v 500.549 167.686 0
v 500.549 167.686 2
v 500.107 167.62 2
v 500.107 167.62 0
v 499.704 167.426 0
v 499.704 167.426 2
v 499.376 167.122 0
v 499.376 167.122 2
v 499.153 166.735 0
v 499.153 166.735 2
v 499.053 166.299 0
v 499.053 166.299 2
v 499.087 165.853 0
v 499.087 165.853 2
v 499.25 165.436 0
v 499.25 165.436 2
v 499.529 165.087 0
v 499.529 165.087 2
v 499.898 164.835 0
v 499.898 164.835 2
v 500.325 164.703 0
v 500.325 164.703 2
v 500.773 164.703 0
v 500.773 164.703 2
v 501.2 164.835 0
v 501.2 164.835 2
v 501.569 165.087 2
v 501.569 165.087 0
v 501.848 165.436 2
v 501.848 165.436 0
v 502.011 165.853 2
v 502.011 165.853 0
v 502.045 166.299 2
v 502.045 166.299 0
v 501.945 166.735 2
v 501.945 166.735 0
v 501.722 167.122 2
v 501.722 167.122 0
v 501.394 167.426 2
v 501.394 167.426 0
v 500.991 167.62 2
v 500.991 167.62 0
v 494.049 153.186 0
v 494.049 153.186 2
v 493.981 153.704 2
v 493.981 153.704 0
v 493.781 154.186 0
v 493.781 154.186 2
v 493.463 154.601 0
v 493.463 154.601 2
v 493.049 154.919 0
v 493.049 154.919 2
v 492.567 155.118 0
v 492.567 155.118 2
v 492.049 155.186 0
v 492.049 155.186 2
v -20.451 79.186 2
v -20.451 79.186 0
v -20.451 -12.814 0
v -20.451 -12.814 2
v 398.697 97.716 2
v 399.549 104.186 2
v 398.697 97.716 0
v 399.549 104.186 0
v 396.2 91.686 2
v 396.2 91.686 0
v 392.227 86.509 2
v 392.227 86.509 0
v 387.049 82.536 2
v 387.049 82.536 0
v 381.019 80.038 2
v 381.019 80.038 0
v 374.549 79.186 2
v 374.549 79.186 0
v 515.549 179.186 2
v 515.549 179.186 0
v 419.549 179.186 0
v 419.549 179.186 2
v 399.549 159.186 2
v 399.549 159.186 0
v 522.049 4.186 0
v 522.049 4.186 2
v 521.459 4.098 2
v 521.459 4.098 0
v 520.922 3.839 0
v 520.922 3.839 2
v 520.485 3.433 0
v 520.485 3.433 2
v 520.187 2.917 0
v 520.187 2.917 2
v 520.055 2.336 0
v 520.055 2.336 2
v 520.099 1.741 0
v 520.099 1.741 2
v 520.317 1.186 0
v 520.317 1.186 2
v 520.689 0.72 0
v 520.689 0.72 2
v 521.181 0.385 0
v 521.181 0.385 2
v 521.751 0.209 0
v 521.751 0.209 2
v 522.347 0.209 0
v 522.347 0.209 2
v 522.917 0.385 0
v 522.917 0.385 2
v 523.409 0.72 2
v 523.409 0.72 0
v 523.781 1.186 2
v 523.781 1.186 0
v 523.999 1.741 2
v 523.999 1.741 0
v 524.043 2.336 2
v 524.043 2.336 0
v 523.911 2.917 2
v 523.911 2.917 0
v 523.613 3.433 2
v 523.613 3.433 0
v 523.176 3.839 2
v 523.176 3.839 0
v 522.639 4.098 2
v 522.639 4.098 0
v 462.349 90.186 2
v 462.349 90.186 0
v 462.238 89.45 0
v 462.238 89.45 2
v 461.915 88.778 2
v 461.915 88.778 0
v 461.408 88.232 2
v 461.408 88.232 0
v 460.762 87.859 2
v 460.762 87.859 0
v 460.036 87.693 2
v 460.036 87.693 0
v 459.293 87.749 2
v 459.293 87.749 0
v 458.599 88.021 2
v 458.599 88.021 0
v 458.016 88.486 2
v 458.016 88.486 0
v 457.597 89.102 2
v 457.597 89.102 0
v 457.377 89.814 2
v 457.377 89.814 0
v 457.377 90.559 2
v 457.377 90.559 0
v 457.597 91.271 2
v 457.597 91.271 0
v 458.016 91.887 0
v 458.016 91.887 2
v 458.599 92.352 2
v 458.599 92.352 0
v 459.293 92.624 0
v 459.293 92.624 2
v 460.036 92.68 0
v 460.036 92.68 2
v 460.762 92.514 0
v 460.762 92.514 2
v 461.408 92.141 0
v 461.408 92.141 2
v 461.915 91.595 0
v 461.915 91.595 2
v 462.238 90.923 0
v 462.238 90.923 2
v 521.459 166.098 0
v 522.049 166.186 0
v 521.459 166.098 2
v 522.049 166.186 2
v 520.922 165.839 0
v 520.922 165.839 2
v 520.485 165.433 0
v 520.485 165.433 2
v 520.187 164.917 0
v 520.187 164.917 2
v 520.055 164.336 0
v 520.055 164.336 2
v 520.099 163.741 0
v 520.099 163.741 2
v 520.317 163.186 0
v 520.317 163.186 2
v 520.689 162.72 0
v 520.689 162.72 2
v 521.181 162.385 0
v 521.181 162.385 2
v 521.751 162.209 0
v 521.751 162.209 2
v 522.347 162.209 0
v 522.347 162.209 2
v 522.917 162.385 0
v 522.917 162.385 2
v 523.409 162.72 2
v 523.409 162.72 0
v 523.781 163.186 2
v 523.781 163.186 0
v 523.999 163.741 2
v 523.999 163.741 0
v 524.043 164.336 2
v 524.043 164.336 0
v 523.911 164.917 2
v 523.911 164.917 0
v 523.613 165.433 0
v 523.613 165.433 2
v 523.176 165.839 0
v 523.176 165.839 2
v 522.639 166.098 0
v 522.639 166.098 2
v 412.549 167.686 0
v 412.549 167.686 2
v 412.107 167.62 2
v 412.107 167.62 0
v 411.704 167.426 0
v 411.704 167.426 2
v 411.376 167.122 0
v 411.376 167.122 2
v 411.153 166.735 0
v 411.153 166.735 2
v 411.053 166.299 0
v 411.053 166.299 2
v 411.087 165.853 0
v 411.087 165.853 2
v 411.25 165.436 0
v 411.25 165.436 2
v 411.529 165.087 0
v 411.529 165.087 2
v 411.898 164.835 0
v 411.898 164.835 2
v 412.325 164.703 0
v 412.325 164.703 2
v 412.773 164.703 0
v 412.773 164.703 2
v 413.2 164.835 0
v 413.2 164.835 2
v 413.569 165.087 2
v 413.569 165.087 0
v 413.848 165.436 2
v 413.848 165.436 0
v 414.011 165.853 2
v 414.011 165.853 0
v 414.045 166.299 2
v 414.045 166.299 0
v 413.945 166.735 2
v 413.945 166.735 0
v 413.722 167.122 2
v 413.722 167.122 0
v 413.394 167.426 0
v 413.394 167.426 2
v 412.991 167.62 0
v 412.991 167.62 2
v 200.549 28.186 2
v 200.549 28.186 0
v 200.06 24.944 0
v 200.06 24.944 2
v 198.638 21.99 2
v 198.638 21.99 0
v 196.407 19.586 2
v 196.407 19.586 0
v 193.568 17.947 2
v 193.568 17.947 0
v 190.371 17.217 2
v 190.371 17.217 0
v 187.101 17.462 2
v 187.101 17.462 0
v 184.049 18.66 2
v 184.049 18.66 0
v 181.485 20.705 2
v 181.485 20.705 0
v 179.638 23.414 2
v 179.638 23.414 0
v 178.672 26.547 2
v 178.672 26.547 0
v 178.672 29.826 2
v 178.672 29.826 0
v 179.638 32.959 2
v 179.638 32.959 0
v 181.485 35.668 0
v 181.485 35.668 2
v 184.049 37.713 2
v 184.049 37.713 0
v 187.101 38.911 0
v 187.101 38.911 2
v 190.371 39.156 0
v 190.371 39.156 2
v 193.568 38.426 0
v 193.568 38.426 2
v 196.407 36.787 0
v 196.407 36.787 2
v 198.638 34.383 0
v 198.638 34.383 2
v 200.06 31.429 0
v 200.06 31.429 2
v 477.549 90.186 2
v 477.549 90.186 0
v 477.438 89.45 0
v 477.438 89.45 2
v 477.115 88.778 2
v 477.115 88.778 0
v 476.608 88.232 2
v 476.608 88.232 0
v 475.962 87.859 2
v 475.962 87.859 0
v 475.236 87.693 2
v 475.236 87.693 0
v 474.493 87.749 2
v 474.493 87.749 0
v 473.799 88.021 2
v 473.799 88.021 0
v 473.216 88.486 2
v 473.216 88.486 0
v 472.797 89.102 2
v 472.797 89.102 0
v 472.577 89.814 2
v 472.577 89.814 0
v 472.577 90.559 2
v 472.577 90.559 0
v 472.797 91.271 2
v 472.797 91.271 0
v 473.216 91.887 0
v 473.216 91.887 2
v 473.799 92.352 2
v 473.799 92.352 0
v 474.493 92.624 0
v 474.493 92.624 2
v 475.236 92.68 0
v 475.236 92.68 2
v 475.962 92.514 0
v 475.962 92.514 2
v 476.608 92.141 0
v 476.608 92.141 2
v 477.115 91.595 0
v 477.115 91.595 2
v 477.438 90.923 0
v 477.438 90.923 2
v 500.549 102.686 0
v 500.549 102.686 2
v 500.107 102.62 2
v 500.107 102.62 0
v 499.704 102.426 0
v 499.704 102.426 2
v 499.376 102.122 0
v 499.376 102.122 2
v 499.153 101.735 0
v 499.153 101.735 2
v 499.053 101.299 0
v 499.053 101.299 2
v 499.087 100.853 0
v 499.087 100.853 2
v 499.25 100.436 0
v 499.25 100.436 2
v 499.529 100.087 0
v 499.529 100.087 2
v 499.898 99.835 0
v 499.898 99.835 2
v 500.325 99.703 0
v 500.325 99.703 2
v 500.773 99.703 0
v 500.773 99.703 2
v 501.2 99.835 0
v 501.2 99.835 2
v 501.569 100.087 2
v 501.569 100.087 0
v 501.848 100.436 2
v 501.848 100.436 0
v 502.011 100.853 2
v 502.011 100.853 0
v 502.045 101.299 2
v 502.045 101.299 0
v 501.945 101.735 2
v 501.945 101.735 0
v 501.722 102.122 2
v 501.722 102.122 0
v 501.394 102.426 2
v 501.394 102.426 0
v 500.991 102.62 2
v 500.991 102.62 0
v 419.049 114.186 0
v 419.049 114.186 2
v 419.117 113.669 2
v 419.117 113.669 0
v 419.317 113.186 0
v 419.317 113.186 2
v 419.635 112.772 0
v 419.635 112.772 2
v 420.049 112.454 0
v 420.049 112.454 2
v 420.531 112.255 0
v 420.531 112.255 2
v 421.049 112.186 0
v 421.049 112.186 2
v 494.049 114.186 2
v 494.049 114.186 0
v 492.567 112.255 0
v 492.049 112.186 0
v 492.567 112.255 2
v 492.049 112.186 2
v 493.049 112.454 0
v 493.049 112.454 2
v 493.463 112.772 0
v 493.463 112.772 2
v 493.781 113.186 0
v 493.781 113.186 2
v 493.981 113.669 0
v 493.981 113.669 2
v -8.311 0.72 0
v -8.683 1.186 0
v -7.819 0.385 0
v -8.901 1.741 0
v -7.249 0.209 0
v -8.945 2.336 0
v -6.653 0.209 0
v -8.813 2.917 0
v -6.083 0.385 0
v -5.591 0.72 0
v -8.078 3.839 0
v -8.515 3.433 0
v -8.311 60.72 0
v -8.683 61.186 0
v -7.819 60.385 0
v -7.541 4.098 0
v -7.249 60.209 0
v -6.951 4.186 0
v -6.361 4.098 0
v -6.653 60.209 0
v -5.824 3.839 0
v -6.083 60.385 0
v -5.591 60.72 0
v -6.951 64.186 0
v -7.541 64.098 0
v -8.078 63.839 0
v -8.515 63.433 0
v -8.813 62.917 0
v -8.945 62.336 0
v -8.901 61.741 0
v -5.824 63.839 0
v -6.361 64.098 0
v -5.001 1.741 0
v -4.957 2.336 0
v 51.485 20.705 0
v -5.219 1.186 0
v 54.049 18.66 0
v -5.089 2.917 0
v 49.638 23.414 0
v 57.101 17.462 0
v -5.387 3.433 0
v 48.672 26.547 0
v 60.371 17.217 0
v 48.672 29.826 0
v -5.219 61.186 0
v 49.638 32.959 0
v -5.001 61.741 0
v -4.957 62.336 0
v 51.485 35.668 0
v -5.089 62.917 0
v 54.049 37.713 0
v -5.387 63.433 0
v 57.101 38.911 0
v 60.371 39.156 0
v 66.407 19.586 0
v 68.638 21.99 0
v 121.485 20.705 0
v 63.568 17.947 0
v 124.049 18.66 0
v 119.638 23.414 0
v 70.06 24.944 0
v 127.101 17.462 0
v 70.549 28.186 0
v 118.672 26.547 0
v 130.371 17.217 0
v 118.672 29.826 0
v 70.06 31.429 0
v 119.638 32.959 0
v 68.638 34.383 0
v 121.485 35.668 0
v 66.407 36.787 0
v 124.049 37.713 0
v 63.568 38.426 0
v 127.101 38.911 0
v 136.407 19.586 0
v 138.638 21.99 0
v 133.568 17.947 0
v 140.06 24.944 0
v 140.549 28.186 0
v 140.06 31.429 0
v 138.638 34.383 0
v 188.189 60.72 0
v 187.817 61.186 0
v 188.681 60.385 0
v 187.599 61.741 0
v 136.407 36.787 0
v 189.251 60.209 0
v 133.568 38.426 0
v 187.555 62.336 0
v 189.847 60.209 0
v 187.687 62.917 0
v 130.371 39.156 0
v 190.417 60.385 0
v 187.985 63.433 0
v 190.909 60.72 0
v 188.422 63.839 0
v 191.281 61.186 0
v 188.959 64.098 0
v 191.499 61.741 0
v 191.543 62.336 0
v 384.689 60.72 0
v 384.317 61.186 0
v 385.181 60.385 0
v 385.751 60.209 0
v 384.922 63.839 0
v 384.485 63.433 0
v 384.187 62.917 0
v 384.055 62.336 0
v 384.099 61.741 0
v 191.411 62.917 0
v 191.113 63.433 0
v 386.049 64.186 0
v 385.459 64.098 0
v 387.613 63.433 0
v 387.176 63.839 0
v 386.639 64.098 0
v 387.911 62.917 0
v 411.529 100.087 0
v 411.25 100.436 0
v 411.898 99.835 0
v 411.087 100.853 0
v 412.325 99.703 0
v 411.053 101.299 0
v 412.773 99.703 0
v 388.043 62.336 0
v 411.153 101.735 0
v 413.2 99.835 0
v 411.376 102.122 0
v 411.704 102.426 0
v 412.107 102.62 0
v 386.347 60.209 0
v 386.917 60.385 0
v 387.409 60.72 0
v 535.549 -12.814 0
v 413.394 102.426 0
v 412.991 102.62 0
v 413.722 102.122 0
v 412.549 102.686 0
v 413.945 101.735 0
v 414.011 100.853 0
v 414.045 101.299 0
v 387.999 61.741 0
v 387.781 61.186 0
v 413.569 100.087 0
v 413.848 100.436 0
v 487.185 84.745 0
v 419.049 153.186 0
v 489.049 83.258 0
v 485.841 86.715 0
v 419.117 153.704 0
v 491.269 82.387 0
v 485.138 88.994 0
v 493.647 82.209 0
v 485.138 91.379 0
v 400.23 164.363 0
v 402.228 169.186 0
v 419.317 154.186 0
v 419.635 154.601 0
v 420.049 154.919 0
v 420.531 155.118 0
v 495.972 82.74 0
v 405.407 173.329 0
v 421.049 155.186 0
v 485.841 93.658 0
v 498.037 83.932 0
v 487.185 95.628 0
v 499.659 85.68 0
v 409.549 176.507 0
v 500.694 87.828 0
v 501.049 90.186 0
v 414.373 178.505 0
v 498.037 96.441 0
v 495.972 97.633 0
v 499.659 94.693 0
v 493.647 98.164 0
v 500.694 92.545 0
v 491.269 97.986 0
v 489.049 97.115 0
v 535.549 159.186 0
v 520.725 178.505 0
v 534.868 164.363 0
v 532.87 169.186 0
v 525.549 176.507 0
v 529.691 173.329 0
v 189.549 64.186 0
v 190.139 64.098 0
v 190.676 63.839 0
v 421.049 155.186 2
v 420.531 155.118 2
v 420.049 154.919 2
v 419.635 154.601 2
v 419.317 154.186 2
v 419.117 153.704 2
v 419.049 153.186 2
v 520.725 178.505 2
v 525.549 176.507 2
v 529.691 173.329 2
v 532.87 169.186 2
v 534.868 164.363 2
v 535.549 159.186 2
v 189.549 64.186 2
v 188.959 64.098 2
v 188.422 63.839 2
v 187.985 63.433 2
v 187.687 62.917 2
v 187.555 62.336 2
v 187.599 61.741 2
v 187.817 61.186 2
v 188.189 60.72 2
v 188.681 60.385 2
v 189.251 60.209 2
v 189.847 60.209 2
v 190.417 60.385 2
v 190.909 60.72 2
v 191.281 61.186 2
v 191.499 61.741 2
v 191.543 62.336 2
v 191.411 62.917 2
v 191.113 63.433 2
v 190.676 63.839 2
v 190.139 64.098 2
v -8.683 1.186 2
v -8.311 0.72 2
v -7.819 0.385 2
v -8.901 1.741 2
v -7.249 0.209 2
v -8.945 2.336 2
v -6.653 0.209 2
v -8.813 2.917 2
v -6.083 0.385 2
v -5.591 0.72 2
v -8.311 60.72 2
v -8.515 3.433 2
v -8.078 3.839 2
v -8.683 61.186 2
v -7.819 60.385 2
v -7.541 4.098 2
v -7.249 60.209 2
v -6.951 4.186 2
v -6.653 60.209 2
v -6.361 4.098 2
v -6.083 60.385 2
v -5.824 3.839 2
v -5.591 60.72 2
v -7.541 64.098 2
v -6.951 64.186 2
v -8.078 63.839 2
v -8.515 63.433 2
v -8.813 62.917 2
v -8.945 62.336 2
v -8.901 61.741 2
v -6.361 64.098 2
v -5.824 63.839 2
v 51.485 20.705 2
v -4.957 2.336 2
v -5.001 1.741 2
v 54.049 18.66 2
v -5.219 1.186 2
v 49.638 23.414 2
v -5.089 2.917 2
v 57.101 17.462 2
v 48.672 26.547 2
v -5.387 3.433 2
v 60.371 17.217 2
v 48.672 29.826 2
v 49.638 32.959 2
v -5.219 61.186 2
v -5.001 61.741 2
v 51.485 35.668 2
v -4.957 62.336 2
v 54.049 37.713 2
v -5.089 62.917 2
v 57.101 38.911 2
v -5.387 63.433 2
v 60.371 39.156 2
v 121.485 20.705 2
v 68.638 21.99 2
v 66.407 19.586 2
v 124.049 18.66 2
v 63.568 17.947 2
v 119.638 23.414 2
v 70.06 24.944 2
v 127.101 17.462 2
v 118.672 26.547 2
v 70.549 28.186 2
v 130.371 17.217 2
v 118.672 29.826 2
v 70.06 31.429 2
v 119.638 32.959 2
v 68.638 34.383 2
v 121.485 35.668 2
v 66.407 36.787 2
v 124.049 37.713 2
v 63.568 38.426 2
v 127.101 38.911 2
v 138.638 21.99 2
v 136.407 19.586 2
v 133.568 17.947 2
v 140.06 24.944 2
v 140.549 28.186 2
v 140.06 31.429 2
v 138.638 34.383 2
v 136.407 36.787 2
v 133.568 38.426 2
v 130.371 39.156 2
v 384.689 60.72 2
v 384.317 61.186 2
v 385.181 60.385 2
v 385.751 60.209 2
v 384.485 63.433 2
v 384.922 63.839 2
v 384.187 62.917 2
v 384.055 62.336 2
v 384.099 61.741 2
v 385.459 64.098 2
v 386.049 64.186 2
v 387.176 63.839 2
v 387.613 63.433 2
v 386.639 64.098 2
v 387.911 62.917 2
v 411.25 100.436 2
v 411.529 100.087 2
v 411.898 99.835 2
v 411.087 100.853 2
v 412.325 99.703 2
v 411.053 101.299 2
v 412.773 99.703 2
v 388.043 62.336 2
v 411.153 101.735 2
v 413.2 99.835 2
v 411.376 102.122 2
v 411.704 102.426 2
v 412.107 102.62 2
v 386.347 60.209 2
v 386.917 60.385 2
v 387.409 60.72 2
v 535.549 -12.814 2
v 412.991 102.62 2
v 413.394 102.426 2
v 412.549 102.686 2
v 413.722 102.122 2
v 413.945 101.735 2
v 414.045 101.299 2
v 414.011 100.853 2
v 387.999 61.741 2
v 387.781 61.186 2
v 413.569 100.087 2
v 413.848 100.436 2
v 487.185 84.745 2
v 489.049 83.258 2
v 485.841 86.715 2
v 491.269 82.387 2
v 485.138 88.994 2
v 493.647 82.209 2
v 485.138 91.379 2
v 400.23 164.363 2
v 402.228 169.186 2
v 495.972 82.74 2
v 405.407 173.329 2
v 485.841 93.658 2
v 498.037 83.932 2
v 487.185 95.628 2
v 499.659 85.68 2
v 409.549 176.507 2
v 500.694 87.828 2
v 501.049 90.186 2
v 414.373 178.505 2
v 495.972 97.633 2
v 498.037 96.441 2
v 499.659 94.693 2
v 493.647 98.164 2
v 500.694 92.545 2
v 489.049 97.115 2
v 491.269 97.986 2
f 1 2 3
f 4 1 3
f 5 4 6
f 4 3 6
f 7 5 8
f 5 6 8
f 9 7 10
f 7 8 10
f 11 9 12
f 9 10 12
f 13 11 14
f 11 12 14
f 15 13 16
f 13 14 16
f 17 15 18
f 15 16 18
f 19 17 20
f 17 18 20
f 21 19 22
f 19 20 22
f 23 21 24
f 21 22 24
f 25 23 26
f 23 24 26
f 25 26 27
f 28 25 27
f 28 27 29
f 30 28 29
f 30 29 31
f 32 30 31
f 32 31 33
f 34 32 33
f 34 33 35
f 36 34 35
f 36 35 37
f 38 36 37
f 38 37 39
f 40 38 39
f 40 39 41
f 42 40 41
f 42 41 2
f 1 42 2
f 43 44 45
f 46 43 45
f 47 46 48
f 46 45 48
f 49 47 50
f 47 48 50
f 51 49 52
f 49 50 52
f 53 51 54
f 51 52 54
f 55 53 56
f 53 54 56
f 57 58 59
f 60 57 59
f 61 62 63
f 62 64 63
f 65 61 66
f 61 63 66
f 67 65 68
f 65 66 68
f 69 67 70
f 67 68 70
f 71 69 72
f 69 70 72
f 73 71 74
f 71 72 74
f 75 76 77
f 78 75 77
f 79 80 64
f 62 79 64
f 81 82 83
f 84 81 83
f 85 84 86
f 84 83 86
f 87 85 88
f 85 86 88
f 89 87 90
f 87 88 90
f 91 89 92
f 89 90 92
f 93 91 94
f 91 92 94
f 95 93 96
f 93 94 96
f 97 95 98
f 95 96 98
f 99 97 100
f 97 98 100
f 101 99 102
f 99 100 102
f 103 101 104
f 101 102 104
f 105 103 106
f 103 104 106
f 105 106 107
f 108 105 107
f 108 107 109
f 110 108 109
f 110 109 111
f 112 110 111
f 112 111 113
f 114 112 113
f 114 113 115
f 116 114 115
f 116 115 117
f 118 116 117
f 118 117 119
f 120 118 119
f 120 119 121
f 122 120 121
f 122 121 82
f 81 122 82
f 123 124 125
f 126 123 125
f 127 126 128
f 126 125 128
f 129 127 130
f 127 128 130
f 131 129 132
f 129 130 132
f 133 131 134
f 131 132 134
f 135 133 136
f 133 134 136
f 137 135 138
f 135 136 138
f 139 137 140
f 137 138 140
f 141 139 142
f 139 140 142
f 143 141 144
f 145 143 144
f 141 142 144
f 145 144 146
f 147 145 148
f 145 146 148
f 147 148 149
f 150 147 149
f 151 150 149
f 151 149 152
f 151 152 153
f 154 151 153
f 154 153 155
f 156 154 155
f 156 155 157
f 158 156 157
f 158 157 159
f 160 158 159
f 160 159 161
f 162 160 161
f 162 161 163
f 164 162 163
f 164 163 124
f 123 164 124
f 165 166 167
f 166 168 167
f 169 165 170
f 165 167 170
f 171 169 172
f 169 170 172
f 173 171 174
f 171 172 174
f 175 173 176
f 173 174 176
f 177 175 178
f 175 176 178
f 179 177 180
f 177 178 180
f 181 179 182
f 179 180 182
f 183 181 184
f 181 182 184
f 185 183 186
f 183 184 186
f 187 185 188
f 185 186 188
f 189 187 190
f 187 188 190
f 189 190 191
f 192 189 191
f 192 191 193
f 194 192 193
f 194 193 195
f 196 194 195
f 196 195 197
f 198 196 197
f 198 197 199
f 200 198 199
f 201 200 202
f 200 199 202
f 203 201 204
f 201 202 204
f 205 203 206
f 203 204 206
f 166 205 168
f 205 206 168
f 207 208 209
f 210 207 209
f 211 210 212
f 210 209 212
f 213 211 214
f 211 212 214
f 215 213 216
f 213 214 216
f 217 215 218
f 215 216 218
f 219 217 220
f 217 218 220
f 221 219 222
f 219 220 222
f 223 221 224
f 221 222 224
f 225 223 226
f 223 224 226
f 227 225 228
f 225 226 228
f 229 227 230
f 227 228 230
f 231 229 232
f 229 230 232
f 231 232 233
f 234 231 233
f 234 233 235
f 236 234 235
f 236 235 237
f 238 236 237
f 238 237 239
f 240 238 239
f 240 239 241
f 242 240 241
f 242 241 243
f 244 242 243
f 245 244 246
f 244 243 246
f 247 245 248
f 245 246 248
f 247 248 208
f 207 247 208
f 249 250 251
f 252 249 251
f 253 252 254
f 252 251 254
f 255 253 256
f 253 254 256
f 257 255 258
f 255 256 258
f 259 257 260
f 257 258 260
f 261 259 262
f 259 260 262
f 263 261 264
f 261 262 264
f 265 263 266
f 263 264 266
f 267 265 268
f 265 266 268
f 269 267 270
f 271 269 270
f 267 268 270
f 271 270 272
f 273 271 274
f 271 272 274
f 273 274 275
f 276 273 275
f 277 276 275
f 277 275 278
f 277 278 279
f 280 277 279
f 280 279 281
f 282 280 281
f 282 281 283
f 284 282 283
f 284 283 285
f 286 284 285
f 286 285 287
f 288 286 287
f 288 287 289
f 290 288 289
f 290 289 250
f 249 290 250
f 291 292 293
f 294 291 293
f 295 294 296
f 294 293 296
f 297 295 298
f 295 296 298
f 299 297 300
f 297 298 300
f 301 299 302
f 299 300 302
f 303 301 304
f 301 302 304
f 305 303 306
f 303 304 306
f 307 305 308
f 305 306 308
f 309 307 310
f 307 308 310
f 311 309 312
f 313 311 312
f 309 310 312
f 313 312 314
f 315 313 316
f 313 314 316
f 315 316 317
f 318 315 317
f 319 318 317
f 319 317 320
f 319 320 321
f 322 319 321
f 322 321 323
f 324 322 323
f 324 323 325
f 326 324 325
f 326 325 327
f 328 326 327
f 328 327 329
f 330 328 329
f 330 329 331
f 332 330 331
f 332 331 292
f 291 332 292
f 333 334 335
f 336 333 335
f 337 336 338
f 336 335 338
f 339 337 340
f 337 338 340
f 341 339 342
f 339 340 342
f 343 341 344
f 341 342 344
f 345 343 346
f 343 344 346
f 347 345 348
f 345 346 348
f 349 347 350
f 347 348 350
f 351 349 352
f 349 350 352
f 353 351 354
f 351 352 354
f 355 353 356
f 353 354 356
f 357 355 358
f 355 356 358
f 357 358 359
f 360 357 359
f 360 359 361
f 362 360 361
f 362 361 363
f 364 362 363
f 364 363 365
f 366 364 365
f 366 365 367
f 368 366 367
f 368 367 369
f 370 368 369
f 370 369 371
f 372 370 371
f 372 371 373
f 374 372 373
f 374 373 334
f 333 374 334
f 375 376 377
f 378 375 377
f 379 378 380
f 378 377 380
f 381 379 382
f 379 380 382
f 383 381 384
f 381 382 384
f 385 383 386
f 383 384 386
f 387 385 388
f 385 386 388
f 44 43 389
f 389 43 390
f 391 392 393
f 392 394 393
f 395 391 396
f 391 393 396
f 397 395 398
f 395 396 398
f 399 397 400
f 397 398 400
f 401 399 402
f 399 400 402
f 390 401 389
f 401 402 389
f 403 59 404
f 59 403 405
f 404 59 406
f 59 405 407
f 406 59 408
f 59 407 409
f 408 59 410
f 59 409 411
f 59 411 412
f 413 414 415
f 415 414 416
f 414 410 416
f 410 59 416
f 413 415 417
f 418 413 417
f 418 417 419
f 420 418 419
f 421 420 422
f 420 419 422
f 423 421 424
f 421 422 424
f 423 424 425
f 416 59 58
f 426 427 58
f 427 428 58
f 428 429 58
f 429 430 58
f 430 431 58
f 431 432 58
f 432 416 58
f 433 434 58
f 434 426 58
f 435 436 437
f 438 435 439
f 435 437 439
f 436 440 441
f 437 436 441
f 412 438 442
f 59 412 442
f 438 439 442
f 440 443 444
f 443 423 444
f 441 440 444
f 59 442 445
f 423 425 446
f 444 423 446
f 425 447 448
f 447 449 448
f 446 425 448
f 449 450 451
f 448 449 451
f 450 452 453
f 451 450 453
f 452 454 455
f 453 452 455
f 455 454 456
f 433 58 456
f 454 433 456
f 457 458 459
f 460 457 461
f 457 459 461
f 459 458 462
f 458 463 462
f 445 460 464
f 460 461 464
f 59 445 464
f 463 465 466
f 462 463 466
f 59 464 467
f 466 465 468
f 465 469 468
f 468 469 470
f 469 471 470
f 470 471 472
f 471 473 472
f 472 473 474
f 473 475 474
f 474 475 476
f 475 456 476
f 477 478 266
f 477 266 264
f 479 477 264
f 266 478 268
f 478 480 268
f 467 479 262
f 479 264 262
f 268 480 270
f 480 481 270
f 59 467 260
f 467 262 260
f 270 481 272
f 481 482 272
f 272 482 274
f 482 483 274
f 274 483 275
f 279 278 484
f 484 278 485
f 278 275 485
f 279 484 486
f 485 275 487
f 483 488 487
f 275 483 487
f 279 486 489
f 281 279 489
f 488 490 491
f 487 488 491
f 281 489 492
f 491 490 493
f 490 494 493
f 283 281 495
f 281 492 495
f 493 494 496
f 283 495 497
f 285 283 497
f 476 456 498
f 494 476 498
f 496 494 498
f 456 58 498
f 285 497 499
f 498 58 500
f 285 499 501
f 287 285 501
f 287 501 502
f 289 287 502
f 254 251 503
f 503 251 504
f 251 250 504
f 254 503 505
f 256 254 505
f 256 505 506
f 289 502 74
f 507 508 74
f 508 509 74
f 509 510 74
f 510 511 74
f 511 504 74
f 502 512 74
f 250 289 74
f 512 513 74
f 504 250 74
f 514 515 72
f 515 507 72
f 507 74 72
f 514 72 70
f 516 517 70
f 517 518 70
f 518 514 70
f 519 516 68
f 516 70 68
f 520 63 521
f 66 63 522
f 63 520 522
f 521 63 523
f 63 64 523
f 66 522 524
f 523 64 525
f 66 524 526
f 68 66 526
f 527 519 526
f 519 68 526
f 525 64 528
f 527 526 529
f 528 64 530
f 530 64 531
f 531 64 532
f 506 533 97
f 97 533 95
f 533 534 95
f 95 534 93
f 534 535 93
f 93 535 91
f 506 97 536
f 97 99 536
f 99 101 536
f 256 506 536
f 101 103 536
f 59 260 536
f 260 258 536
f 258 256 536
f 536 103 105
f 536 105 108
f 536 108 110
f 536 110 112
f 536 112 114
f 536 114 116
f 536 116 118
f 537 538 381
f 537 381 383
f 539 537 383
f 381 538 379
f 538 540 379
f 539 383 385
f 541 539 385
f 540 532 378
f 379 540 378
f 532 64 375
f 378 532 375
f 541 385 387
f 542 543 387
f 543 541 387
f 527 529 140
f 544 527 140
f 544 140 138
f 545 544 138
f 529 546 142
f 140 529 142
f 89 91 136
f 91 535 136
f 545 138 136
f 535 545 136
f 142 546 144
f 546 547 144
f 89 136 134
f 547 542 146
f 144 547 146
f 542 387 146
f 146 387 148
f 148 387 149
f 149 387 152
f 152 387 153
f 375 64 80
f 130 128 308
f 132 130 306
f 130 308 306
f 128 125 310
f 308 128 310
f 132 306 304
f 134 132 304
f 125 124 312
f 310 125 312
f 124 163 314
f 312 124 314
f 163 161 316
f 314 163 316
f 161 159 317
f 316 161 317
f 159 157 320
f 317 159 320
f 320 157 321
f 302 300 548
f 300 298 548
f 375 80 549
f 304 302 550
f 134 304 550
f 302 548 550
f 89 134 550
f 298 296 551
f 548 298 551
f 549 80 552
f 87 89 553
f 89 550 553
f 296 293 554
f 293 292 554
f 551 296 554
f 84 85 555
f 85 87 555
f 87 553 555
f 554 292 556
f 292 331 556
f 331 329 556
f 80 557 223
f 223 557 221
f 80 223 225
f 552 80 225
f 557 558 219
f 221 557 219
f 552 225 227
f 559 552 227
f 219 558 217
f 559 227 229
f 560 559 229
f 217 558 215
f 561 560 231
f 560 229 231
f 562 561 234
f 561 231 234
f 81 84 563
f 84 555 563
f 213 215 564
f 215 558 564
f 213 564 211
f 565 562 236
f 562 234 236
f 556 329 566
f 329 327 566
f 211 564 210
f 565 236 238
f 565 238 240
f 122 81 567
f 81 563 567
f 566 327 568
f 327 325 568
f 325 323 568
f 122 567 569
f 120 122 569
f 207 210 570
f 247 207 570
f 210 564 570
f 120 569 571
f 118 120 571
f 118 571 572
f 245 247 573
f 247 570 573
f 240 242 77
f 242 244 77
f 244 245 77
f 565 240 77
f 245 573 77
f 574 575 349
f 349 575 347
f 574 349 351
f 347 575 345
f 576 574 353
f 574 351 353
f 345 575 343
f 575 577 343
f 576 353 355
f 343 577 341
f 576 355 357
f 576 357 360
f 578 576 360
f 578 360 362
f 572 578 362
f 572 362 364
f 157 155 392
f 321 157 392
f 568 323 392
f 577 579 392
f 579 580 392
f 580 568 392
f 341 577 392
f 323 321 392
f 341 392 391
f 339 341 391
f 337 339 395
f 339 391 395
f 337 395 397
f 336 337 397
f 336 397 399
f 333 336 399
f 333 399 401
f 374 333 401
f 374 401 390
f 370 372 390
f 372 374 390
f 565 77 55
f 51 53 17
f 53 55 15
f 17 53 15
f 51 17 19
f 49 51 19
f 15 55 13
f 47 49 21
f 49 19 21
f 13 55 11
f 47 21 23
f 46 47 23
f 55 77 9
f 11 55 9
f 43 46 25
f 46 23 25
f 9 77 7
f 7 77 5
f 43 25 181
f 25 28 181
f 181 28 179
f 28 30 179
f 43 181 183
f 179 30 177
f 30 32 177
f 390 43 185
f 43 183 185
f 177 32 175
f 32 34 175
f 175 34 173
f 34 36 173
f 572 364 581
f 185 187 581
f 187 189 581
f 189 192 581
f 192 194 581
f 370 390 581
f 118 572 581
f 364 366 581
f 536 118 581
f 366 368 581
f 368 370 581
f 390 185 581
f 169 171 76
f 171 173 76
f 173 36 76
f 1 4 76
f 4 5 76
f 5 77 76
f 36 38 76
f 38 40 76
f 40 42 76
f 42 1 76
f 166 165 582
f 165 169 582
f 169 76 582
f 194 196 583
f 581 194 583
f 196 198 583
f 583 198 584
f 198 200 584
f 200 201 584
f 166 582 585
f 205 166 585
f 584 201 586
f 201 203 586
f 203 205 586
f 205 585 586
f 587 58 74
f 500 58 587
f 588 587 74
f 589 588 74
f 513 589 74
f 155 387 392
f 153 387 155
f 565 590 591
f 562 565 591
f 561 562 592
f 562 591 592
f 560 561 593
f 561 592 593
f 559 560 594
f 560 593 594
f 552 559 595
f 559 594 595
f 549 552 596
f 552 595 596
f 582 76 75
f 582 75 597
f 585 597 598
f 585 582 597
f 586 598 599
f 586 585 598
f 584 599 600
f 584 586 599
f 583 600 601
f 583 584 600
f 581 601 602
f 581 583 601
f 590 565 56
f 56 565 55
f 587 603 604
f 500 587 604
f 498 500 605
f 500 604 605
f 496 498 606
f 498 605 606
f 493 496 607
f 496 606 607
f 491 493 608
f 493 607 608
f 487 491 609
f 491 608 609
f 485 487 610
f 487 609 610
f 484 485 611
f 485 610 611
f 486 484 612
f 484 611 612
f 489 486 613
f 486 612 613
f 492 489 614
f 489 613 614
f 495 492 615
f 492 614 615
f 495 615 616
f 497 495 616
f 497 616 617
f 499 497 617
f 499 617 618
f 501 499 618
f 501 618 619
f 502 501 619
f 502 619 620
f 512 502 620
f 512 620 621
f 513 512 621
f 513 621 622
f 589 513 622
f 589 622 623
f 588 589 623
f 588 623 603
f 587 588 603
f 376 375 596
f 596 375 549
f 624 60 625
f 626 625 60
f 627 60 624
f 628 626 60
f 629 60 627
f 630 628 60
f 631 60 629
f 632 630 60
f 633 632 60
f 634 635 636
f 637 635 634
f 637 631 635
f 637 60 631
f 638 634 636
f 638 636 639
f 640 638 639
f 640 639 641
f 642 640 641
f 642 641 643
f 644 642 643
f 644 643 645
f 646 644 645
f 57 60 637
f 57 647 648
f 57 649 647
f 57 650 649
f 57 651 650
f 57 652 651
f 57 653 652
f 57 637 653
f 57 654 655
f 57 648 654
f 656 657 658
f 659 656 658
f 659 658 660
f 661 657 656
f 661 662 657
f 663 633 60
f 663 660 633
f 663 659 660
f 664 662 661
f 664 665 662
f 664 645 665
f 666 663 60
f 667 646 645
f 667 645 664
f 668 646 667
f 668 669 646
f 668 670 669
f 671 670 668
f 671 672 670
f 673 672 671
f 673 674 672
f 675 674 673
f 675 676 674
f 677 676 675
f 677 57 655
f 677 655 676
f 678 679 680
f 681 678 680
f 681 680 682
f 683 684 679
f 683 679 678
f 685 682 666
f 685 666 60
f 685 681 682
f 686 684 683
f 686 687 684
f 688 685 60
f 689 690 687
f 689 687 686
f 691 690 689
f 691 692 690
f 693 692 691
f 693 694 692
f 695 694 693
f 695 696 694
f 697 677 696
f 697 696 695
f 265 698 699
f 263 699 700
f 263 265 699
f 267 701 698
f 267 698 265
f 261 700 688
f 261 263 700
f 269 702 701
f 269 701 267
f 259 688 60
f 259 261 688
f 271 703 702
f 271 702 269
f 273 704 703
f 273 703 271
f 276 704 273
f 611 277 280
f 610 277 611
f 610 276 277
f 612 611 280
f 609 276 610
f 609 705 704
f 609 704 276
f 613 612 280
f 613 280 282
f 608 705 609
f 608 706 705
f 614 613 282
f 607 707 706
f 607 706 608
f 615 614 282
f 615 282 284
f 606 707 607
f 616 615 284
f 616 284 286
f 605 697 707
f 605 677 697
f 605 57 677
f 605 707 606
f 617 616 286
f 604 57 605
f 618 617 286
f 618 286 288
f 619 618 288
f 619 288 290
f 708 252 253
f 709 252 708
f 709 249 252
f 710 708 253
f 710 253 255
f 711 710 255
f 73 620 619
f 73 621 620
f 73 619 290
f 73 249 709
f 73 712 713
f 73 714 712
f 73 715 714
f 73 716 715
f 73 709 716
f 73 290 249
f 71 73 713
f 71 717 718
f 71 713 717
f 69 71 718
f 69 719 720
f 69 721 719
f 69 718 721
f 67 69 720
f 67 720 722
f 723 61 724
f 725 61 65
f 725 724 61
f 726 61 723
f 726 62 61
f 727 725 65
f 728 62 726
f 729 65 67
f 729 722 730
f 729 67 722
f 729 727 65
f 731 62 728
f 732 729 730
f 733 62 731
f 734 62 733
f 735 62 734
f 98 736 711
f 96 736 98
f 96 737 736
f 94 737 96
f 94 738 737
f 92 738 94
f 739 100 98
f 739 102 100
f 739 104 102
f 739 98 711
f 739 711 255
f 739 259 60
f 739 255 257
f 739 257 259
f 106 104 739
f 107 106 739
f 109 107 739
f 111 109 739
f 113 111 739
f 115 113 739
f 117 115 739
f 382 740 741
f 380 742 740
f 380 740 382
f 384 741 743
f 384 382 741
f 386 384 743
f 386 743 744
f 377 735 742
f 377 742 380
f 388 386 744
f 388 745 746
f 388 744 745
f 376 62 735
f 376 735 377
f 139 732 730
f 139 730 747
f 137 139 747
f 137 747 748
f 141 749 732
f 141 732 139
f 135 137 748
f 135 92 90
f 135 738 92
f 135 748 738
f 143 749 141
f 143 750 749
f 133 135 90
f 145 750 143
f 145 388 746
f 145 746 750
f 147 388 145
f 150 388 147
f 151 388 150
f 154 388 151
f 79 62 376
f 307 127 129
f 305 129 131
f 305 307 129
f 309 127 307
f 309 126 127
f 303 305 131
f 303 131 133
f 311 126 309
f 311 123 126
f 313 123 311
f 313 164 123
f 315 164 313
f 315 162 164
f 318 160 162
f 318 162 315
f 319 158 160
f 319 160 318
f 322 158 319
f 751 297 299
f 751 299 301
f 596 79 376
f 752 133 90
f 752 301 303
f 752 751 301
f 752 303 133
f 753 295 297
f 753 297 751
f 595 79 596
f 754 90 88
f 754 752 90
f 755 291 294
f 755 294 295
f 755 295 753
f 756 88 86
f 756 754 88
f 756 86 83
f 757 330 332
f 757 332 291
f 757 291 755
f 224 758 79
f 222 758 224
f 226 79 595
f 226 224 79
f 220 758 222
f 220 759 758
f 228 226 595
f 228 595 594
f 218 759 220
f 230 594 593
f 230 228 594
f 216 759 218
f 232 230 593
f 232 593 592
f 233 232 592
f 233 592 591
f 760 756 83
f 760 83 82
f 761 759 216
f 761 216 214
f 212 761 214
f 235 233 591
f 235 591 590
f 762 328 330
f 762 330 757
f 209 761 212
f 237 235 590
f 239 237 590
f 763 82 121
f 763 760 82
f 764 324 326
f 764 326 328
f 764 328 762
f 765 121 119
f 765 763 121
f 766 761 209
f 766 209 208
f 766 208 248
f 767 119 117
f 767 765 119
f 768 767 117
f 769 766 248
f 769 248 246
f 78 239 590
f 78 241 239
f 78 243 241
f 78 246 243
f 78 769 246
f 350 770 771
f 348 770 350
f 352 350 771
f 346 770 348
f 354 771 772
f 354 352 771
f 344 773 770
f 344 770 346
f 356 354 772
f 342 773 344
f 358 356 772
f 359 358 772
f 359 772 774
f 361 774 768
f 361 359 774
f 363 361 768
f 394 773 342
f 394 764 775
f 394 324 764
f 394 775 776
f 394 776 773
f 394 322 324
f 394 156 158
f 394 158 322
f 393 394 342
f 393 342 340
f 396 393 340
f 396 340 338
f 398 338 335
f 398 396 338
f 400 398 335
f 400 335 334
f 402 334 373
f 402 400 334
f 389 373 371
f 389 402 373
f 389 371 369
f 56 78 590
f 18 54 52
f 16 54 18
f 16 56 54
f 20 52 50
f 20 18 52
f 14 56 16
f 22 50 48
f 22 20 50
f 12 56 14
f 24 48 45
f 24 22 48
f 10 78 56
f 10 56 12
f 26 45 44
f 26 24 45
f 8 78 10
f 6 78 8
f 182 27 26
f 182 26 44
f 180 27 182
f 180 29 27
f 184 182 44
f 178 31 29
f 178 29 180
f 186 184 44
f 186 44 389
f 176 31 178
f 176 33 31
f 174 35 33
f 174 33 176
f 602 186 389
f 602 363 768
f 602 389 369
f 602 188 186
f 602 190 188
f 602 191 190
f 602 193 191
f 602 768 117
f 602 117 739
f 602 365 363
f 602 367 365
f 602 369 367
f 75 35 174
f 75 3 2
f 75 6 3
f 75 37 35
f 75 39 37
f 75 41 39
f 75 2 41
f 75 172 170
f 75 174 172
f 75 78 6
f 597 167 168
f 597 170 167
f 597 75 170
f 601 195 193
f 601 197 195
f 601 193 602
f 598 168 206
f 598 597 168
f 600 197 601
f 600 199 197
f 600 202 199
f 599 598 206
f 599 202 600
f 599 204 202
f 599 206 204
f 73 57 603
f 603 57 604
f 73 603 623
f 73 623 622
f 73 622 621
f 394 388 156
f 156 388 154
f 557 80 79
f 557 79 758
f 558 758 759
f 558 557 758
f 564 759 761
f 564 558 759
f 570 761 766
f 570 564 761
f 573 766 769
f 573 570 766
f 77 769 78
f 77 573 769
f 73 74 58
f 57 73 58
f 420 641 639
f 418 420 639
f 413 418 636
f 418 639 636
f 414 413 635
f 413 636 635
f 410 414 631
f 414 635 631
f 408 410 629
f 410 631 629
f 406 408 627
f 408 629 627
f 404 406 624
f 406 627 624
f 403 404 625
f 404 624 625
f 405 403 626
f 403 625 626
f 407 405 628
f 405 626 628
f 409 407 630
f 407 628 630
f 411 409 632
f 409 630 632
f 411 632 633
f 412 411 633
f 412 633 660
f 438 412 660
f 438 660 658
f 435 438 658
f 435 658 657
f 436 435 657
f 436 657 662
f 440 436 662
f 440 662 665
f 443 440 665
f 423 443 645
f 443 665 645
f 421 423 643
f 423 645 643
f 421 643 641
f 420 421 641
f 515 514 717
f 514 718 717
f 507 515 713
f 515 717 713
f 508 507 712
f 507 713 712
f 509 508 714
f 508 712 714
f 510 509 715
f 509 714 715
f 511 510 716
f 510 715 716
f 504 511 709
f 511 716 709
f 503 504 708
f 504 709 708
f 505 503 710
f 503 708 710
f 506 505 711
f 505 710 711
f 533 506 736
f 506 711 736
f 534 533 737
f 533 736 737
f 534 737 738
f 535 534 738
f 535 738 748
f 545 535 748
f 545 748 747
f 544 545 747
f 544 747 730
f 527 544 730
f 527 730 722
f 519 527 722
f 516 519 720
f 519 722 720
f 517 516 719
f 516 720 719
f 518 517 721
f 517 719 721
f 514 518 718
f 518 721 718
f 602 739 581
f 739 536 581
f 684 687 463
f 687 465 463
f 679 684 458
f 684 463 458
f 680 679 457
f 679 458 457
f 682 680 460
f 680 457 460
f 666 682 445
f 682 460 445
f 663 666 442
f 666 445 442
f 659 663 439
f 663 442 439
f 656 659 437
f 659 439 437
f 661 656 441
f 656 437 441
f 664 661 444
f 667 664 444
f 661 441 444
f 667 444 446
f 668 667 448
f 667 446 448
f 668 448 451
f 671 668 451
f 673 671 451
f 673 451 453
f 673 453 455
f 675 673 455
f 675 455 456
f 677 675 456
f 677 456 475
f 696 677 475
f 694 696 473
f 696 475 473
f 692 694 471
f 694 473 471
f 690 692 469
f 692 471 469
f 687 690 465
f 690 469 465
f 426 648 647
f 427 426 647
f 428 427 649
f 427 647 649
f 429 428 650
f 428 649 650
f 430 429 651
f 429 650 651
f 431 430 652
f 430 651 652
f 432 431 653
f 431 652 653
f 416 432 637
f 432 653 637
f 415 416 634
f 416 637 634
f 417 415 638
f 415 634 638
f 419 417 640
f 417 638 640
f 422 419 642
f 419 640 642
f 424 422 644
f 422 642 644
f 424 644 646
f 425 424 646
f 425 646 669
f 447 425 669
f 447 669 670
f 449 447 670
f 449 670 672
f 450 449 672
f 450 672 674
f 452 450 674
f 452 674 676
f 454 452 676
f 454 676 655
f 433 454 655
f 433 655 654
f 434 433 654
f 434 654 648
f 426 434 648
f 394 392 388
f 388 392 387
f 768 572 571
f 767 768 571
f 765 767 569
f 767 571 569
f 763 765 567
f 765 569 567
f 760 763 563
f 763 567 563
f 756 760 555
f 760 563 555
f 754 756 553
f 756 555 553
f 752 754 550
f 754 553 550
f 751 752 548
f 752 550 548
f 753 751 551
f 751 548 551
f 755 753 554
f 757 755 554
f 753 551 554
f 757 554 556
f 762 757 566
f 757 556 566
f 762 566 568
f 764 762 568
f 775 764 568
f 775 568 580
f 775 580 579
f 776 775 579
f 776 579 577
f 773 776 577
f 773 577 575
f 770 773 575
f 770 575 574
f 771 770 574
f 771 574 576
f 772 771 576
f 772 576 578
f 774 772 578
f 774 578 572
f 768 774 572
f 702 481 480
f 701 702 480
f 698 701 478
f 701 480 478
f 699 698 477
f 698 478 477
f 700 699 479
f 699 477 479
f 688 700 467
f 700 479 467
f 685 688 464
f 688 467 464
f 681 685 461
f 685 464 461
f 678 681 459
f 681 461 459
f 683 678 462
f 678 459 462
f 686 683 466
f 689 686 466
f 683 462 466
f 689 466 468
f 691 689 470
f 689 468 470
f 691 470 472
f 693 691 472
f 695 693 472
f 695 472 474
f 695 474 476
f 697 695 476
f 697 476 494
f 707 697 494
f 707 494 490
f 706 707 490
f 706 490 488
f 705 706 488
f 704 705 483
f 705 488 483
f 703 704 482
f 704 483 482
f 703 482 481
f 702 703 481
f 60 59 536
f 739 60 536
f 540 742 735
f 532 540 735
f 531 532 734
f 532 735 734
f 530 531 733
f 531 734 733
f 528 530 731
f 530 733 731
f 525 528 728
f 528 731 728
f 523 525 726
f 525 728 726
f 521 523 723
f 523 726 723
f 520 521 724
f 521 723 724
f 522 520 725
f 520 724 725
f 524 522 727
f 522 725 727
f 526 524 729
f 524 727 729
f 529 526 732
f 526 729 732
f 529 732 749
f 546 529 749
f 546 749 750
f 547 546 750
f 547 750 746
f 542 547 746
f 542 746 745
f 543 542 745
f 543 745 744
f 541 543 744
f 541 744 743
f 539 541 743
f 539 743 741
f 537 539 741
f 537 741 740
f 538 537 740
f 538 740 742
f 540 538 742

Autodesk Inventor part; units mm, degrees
ref_plane "YZ Plane" through (0, 0, 0) normal (1, 0, 0) x (0, 1, 0)
ref_plane "XZ Plane" through (0, 0, 0) normal (0, 1, 0) x (-1, 0, 0)
ref_plane "XY Plane" through (0, 0, 0) normal (0, 0, 1) x (1, 0, 0)
sketch "Szkic1" plane through (0, 0, 0) normal (0, 0, 1) x (1, 0, 0)
  line L0 (-20.451, -12.8135) -> (535.549, -12.8135)
  line L1 (535.549, -12.8135) -> (535.549, 159.1865)
  line L2 (515.549, 179.1865) -> (419.549, 179.1865)
  line L3 (399.549, 159.1865) -> (399.549, 104.1865)
  line L4 (374.549, 79.1865) -> (-20.451, 79.1865)
  line L5 (-20.451, 79.1865) -> (-20.451, -12.8135)
  line L6 (419.049, 155.1865) -> (494.049, 155.1865)
  line L7 (494.049, 155.1865) -> (494.049, 112.1865)
  line L8 (494.049, 112.1865) -> (419.049, 112.1865)
  line L9 (419.049, 112.1865) -> (419.049, 155.1865)
  arc A0 (374.549, 79.1865) -> (399.549, 104.1865) centre (374.549, 104.1865) ccw
  arc A1 (419.549, 179.1865) -> (399.549, 159.1865) centre (419.549, 159.1865) ccw
  arc A2 (535.549, 159.1865) -> (515.549, 179.1865) centre (515.549, 159.1865) ccw
  circle A3 centre (493.049, 90.1865) radius 8
  circle A4 centre (475.049, 90.1865) radius 2.5
  circle A5 centre (459.849, 90.1865) radius 2.5
  circle A6 centre (189.549, 28.1865) radius 11
  circle A7 centre (129.549, 28.1865) radius 11
  circle A8 centre (59.549, 28.1865) radius 11
  point P0 (0, 0)
  point P1 (535.549, 179.1865)
  point P2 (399.549, 179.1865)
  point P3 (399.549, 79.1865)
  point P4 (500.549, 166.1865)
  point P5 (500.549, 101.1865)
  point P6 (412.549, 101.1865)
  point P7 (412.549, 166.1865)
  point P8 (386.049, 62.1865)
  point P9 (522.049, 164.1865)
  point P10 (522.049, 2.1865)
  point P11 (-6.951, 2.1865)
  point P12 (-6.951, 62.1865)
  point P13 (189.549, 62.1865)
  dimension "d0" = 556
  dimension "d1" = 92
  dimension "d2" = 100
  dimension "d3" = 136
  dimension "d6" = 75
  dimension "d7" = 43
  dimension "d8" = 24
  dimension "d12" = 25
  dimension "d13" = 20
  dimension "d14" = 20
  dimension "d15" = 41.5
  dimension "d18" = 6.5
  dimension "d19" = 6.5
  dimension "d20" = 6.5
  dimension "d21" = 6.5
  dimension "d22" = 11
  dimension "d23" = 11
  dimension "d24" = 11
  dimension "d25" = 11
  dimension "d33" = 16
  dimension "d34" = 5
  dimension "d35" = 5
  dimension "d40" = 18
  dimension "d41" = 15.2
  dimension "d44" = 13.5
  dimension "d45" = 13.5
  dimension "d46" = 13.5
  dimension "d47" = 13.5
  dimension "d48" = 17
  dimension "d49" = 17
  dimension "d50" = 17
  dimension "d58" = 15
  dimension "d59" = 15
  dimension "d60" = 15
  dimension "d61" = 13.5
  dimension "d62" = 393
  dimension "d63" = 196.5
  dimension "d64" = 22
  dimension "d65" = 22
  dimension "d66" = 22
  dimension "d67" = 41
  dimension "d68" = 41
  dimension "d69" = 41
  dimension "d71" = 70
  dimension "d72" = 60
  dimension "d73" = 80
  dimension "d74" = 88
  dimension "d75" = 65
  dimension "d79" = 65
  dimension "d80" = 7.5
  dimension "d81" = 11
  dimension "d82" = 11
  dimension "d83" = 11
extrude "Wyciągnięcie proste2" add sketch "Szkic1" along normal blind 2 contours L5 L4 A0 L3 A1 L2 A2 L1 L0 | A3 | A4 | A5 | A6 | A7 | A8
fillet "Zaokrąglenie1" radius 2 4 edges at (419.049, 112.1865, 1) (494.049, 112.1865, 1) (494.049, 155.1865, 1) (419.049, 155.1865, 1)
hole "Otwór1" at (500.549, 166.1865, 0) at (500.549, 101.1865, 0) at (412.549, 101.1865, 0) at (412.549, 166.1865, 0) direction (0, 0, 1) diameter 3 end through all
extrude "Wyciągnięcie proste3" cut sketch "Szkic1" along normal blind 10 contours A3 | A4 | A5 | A6 | A7 | A8
hole "Otwór2" at (386.049, 62.1865, 0) at (522.049, 164.1865, 0) at (522.049, 2.1865, 0) at (-6.951, 2.1865, 0) at (-6.951, 62.1865, 0) at (189.549, 62.1865, 0) direction (0, 0, 1) diameter 4 end through all
equation "\"d23\" = d22"
equation "\"d24\" = d22"
equation "\"d25\" = d22"
equation "\"d45\" = d44"
equation "\"d46\" = d44"
equation "\"d47\" = d44"
equation "\"d50\" = d48"
equation "\"d59\" = d58"
equation "\"d61\" = d46"
equation "\"d63\" = 0.5 * d62"
equation "\"d68\" = d67"
equation "\"d69\" = d67"
properties part number "LC_ALU_2mm_Front_Plate"
